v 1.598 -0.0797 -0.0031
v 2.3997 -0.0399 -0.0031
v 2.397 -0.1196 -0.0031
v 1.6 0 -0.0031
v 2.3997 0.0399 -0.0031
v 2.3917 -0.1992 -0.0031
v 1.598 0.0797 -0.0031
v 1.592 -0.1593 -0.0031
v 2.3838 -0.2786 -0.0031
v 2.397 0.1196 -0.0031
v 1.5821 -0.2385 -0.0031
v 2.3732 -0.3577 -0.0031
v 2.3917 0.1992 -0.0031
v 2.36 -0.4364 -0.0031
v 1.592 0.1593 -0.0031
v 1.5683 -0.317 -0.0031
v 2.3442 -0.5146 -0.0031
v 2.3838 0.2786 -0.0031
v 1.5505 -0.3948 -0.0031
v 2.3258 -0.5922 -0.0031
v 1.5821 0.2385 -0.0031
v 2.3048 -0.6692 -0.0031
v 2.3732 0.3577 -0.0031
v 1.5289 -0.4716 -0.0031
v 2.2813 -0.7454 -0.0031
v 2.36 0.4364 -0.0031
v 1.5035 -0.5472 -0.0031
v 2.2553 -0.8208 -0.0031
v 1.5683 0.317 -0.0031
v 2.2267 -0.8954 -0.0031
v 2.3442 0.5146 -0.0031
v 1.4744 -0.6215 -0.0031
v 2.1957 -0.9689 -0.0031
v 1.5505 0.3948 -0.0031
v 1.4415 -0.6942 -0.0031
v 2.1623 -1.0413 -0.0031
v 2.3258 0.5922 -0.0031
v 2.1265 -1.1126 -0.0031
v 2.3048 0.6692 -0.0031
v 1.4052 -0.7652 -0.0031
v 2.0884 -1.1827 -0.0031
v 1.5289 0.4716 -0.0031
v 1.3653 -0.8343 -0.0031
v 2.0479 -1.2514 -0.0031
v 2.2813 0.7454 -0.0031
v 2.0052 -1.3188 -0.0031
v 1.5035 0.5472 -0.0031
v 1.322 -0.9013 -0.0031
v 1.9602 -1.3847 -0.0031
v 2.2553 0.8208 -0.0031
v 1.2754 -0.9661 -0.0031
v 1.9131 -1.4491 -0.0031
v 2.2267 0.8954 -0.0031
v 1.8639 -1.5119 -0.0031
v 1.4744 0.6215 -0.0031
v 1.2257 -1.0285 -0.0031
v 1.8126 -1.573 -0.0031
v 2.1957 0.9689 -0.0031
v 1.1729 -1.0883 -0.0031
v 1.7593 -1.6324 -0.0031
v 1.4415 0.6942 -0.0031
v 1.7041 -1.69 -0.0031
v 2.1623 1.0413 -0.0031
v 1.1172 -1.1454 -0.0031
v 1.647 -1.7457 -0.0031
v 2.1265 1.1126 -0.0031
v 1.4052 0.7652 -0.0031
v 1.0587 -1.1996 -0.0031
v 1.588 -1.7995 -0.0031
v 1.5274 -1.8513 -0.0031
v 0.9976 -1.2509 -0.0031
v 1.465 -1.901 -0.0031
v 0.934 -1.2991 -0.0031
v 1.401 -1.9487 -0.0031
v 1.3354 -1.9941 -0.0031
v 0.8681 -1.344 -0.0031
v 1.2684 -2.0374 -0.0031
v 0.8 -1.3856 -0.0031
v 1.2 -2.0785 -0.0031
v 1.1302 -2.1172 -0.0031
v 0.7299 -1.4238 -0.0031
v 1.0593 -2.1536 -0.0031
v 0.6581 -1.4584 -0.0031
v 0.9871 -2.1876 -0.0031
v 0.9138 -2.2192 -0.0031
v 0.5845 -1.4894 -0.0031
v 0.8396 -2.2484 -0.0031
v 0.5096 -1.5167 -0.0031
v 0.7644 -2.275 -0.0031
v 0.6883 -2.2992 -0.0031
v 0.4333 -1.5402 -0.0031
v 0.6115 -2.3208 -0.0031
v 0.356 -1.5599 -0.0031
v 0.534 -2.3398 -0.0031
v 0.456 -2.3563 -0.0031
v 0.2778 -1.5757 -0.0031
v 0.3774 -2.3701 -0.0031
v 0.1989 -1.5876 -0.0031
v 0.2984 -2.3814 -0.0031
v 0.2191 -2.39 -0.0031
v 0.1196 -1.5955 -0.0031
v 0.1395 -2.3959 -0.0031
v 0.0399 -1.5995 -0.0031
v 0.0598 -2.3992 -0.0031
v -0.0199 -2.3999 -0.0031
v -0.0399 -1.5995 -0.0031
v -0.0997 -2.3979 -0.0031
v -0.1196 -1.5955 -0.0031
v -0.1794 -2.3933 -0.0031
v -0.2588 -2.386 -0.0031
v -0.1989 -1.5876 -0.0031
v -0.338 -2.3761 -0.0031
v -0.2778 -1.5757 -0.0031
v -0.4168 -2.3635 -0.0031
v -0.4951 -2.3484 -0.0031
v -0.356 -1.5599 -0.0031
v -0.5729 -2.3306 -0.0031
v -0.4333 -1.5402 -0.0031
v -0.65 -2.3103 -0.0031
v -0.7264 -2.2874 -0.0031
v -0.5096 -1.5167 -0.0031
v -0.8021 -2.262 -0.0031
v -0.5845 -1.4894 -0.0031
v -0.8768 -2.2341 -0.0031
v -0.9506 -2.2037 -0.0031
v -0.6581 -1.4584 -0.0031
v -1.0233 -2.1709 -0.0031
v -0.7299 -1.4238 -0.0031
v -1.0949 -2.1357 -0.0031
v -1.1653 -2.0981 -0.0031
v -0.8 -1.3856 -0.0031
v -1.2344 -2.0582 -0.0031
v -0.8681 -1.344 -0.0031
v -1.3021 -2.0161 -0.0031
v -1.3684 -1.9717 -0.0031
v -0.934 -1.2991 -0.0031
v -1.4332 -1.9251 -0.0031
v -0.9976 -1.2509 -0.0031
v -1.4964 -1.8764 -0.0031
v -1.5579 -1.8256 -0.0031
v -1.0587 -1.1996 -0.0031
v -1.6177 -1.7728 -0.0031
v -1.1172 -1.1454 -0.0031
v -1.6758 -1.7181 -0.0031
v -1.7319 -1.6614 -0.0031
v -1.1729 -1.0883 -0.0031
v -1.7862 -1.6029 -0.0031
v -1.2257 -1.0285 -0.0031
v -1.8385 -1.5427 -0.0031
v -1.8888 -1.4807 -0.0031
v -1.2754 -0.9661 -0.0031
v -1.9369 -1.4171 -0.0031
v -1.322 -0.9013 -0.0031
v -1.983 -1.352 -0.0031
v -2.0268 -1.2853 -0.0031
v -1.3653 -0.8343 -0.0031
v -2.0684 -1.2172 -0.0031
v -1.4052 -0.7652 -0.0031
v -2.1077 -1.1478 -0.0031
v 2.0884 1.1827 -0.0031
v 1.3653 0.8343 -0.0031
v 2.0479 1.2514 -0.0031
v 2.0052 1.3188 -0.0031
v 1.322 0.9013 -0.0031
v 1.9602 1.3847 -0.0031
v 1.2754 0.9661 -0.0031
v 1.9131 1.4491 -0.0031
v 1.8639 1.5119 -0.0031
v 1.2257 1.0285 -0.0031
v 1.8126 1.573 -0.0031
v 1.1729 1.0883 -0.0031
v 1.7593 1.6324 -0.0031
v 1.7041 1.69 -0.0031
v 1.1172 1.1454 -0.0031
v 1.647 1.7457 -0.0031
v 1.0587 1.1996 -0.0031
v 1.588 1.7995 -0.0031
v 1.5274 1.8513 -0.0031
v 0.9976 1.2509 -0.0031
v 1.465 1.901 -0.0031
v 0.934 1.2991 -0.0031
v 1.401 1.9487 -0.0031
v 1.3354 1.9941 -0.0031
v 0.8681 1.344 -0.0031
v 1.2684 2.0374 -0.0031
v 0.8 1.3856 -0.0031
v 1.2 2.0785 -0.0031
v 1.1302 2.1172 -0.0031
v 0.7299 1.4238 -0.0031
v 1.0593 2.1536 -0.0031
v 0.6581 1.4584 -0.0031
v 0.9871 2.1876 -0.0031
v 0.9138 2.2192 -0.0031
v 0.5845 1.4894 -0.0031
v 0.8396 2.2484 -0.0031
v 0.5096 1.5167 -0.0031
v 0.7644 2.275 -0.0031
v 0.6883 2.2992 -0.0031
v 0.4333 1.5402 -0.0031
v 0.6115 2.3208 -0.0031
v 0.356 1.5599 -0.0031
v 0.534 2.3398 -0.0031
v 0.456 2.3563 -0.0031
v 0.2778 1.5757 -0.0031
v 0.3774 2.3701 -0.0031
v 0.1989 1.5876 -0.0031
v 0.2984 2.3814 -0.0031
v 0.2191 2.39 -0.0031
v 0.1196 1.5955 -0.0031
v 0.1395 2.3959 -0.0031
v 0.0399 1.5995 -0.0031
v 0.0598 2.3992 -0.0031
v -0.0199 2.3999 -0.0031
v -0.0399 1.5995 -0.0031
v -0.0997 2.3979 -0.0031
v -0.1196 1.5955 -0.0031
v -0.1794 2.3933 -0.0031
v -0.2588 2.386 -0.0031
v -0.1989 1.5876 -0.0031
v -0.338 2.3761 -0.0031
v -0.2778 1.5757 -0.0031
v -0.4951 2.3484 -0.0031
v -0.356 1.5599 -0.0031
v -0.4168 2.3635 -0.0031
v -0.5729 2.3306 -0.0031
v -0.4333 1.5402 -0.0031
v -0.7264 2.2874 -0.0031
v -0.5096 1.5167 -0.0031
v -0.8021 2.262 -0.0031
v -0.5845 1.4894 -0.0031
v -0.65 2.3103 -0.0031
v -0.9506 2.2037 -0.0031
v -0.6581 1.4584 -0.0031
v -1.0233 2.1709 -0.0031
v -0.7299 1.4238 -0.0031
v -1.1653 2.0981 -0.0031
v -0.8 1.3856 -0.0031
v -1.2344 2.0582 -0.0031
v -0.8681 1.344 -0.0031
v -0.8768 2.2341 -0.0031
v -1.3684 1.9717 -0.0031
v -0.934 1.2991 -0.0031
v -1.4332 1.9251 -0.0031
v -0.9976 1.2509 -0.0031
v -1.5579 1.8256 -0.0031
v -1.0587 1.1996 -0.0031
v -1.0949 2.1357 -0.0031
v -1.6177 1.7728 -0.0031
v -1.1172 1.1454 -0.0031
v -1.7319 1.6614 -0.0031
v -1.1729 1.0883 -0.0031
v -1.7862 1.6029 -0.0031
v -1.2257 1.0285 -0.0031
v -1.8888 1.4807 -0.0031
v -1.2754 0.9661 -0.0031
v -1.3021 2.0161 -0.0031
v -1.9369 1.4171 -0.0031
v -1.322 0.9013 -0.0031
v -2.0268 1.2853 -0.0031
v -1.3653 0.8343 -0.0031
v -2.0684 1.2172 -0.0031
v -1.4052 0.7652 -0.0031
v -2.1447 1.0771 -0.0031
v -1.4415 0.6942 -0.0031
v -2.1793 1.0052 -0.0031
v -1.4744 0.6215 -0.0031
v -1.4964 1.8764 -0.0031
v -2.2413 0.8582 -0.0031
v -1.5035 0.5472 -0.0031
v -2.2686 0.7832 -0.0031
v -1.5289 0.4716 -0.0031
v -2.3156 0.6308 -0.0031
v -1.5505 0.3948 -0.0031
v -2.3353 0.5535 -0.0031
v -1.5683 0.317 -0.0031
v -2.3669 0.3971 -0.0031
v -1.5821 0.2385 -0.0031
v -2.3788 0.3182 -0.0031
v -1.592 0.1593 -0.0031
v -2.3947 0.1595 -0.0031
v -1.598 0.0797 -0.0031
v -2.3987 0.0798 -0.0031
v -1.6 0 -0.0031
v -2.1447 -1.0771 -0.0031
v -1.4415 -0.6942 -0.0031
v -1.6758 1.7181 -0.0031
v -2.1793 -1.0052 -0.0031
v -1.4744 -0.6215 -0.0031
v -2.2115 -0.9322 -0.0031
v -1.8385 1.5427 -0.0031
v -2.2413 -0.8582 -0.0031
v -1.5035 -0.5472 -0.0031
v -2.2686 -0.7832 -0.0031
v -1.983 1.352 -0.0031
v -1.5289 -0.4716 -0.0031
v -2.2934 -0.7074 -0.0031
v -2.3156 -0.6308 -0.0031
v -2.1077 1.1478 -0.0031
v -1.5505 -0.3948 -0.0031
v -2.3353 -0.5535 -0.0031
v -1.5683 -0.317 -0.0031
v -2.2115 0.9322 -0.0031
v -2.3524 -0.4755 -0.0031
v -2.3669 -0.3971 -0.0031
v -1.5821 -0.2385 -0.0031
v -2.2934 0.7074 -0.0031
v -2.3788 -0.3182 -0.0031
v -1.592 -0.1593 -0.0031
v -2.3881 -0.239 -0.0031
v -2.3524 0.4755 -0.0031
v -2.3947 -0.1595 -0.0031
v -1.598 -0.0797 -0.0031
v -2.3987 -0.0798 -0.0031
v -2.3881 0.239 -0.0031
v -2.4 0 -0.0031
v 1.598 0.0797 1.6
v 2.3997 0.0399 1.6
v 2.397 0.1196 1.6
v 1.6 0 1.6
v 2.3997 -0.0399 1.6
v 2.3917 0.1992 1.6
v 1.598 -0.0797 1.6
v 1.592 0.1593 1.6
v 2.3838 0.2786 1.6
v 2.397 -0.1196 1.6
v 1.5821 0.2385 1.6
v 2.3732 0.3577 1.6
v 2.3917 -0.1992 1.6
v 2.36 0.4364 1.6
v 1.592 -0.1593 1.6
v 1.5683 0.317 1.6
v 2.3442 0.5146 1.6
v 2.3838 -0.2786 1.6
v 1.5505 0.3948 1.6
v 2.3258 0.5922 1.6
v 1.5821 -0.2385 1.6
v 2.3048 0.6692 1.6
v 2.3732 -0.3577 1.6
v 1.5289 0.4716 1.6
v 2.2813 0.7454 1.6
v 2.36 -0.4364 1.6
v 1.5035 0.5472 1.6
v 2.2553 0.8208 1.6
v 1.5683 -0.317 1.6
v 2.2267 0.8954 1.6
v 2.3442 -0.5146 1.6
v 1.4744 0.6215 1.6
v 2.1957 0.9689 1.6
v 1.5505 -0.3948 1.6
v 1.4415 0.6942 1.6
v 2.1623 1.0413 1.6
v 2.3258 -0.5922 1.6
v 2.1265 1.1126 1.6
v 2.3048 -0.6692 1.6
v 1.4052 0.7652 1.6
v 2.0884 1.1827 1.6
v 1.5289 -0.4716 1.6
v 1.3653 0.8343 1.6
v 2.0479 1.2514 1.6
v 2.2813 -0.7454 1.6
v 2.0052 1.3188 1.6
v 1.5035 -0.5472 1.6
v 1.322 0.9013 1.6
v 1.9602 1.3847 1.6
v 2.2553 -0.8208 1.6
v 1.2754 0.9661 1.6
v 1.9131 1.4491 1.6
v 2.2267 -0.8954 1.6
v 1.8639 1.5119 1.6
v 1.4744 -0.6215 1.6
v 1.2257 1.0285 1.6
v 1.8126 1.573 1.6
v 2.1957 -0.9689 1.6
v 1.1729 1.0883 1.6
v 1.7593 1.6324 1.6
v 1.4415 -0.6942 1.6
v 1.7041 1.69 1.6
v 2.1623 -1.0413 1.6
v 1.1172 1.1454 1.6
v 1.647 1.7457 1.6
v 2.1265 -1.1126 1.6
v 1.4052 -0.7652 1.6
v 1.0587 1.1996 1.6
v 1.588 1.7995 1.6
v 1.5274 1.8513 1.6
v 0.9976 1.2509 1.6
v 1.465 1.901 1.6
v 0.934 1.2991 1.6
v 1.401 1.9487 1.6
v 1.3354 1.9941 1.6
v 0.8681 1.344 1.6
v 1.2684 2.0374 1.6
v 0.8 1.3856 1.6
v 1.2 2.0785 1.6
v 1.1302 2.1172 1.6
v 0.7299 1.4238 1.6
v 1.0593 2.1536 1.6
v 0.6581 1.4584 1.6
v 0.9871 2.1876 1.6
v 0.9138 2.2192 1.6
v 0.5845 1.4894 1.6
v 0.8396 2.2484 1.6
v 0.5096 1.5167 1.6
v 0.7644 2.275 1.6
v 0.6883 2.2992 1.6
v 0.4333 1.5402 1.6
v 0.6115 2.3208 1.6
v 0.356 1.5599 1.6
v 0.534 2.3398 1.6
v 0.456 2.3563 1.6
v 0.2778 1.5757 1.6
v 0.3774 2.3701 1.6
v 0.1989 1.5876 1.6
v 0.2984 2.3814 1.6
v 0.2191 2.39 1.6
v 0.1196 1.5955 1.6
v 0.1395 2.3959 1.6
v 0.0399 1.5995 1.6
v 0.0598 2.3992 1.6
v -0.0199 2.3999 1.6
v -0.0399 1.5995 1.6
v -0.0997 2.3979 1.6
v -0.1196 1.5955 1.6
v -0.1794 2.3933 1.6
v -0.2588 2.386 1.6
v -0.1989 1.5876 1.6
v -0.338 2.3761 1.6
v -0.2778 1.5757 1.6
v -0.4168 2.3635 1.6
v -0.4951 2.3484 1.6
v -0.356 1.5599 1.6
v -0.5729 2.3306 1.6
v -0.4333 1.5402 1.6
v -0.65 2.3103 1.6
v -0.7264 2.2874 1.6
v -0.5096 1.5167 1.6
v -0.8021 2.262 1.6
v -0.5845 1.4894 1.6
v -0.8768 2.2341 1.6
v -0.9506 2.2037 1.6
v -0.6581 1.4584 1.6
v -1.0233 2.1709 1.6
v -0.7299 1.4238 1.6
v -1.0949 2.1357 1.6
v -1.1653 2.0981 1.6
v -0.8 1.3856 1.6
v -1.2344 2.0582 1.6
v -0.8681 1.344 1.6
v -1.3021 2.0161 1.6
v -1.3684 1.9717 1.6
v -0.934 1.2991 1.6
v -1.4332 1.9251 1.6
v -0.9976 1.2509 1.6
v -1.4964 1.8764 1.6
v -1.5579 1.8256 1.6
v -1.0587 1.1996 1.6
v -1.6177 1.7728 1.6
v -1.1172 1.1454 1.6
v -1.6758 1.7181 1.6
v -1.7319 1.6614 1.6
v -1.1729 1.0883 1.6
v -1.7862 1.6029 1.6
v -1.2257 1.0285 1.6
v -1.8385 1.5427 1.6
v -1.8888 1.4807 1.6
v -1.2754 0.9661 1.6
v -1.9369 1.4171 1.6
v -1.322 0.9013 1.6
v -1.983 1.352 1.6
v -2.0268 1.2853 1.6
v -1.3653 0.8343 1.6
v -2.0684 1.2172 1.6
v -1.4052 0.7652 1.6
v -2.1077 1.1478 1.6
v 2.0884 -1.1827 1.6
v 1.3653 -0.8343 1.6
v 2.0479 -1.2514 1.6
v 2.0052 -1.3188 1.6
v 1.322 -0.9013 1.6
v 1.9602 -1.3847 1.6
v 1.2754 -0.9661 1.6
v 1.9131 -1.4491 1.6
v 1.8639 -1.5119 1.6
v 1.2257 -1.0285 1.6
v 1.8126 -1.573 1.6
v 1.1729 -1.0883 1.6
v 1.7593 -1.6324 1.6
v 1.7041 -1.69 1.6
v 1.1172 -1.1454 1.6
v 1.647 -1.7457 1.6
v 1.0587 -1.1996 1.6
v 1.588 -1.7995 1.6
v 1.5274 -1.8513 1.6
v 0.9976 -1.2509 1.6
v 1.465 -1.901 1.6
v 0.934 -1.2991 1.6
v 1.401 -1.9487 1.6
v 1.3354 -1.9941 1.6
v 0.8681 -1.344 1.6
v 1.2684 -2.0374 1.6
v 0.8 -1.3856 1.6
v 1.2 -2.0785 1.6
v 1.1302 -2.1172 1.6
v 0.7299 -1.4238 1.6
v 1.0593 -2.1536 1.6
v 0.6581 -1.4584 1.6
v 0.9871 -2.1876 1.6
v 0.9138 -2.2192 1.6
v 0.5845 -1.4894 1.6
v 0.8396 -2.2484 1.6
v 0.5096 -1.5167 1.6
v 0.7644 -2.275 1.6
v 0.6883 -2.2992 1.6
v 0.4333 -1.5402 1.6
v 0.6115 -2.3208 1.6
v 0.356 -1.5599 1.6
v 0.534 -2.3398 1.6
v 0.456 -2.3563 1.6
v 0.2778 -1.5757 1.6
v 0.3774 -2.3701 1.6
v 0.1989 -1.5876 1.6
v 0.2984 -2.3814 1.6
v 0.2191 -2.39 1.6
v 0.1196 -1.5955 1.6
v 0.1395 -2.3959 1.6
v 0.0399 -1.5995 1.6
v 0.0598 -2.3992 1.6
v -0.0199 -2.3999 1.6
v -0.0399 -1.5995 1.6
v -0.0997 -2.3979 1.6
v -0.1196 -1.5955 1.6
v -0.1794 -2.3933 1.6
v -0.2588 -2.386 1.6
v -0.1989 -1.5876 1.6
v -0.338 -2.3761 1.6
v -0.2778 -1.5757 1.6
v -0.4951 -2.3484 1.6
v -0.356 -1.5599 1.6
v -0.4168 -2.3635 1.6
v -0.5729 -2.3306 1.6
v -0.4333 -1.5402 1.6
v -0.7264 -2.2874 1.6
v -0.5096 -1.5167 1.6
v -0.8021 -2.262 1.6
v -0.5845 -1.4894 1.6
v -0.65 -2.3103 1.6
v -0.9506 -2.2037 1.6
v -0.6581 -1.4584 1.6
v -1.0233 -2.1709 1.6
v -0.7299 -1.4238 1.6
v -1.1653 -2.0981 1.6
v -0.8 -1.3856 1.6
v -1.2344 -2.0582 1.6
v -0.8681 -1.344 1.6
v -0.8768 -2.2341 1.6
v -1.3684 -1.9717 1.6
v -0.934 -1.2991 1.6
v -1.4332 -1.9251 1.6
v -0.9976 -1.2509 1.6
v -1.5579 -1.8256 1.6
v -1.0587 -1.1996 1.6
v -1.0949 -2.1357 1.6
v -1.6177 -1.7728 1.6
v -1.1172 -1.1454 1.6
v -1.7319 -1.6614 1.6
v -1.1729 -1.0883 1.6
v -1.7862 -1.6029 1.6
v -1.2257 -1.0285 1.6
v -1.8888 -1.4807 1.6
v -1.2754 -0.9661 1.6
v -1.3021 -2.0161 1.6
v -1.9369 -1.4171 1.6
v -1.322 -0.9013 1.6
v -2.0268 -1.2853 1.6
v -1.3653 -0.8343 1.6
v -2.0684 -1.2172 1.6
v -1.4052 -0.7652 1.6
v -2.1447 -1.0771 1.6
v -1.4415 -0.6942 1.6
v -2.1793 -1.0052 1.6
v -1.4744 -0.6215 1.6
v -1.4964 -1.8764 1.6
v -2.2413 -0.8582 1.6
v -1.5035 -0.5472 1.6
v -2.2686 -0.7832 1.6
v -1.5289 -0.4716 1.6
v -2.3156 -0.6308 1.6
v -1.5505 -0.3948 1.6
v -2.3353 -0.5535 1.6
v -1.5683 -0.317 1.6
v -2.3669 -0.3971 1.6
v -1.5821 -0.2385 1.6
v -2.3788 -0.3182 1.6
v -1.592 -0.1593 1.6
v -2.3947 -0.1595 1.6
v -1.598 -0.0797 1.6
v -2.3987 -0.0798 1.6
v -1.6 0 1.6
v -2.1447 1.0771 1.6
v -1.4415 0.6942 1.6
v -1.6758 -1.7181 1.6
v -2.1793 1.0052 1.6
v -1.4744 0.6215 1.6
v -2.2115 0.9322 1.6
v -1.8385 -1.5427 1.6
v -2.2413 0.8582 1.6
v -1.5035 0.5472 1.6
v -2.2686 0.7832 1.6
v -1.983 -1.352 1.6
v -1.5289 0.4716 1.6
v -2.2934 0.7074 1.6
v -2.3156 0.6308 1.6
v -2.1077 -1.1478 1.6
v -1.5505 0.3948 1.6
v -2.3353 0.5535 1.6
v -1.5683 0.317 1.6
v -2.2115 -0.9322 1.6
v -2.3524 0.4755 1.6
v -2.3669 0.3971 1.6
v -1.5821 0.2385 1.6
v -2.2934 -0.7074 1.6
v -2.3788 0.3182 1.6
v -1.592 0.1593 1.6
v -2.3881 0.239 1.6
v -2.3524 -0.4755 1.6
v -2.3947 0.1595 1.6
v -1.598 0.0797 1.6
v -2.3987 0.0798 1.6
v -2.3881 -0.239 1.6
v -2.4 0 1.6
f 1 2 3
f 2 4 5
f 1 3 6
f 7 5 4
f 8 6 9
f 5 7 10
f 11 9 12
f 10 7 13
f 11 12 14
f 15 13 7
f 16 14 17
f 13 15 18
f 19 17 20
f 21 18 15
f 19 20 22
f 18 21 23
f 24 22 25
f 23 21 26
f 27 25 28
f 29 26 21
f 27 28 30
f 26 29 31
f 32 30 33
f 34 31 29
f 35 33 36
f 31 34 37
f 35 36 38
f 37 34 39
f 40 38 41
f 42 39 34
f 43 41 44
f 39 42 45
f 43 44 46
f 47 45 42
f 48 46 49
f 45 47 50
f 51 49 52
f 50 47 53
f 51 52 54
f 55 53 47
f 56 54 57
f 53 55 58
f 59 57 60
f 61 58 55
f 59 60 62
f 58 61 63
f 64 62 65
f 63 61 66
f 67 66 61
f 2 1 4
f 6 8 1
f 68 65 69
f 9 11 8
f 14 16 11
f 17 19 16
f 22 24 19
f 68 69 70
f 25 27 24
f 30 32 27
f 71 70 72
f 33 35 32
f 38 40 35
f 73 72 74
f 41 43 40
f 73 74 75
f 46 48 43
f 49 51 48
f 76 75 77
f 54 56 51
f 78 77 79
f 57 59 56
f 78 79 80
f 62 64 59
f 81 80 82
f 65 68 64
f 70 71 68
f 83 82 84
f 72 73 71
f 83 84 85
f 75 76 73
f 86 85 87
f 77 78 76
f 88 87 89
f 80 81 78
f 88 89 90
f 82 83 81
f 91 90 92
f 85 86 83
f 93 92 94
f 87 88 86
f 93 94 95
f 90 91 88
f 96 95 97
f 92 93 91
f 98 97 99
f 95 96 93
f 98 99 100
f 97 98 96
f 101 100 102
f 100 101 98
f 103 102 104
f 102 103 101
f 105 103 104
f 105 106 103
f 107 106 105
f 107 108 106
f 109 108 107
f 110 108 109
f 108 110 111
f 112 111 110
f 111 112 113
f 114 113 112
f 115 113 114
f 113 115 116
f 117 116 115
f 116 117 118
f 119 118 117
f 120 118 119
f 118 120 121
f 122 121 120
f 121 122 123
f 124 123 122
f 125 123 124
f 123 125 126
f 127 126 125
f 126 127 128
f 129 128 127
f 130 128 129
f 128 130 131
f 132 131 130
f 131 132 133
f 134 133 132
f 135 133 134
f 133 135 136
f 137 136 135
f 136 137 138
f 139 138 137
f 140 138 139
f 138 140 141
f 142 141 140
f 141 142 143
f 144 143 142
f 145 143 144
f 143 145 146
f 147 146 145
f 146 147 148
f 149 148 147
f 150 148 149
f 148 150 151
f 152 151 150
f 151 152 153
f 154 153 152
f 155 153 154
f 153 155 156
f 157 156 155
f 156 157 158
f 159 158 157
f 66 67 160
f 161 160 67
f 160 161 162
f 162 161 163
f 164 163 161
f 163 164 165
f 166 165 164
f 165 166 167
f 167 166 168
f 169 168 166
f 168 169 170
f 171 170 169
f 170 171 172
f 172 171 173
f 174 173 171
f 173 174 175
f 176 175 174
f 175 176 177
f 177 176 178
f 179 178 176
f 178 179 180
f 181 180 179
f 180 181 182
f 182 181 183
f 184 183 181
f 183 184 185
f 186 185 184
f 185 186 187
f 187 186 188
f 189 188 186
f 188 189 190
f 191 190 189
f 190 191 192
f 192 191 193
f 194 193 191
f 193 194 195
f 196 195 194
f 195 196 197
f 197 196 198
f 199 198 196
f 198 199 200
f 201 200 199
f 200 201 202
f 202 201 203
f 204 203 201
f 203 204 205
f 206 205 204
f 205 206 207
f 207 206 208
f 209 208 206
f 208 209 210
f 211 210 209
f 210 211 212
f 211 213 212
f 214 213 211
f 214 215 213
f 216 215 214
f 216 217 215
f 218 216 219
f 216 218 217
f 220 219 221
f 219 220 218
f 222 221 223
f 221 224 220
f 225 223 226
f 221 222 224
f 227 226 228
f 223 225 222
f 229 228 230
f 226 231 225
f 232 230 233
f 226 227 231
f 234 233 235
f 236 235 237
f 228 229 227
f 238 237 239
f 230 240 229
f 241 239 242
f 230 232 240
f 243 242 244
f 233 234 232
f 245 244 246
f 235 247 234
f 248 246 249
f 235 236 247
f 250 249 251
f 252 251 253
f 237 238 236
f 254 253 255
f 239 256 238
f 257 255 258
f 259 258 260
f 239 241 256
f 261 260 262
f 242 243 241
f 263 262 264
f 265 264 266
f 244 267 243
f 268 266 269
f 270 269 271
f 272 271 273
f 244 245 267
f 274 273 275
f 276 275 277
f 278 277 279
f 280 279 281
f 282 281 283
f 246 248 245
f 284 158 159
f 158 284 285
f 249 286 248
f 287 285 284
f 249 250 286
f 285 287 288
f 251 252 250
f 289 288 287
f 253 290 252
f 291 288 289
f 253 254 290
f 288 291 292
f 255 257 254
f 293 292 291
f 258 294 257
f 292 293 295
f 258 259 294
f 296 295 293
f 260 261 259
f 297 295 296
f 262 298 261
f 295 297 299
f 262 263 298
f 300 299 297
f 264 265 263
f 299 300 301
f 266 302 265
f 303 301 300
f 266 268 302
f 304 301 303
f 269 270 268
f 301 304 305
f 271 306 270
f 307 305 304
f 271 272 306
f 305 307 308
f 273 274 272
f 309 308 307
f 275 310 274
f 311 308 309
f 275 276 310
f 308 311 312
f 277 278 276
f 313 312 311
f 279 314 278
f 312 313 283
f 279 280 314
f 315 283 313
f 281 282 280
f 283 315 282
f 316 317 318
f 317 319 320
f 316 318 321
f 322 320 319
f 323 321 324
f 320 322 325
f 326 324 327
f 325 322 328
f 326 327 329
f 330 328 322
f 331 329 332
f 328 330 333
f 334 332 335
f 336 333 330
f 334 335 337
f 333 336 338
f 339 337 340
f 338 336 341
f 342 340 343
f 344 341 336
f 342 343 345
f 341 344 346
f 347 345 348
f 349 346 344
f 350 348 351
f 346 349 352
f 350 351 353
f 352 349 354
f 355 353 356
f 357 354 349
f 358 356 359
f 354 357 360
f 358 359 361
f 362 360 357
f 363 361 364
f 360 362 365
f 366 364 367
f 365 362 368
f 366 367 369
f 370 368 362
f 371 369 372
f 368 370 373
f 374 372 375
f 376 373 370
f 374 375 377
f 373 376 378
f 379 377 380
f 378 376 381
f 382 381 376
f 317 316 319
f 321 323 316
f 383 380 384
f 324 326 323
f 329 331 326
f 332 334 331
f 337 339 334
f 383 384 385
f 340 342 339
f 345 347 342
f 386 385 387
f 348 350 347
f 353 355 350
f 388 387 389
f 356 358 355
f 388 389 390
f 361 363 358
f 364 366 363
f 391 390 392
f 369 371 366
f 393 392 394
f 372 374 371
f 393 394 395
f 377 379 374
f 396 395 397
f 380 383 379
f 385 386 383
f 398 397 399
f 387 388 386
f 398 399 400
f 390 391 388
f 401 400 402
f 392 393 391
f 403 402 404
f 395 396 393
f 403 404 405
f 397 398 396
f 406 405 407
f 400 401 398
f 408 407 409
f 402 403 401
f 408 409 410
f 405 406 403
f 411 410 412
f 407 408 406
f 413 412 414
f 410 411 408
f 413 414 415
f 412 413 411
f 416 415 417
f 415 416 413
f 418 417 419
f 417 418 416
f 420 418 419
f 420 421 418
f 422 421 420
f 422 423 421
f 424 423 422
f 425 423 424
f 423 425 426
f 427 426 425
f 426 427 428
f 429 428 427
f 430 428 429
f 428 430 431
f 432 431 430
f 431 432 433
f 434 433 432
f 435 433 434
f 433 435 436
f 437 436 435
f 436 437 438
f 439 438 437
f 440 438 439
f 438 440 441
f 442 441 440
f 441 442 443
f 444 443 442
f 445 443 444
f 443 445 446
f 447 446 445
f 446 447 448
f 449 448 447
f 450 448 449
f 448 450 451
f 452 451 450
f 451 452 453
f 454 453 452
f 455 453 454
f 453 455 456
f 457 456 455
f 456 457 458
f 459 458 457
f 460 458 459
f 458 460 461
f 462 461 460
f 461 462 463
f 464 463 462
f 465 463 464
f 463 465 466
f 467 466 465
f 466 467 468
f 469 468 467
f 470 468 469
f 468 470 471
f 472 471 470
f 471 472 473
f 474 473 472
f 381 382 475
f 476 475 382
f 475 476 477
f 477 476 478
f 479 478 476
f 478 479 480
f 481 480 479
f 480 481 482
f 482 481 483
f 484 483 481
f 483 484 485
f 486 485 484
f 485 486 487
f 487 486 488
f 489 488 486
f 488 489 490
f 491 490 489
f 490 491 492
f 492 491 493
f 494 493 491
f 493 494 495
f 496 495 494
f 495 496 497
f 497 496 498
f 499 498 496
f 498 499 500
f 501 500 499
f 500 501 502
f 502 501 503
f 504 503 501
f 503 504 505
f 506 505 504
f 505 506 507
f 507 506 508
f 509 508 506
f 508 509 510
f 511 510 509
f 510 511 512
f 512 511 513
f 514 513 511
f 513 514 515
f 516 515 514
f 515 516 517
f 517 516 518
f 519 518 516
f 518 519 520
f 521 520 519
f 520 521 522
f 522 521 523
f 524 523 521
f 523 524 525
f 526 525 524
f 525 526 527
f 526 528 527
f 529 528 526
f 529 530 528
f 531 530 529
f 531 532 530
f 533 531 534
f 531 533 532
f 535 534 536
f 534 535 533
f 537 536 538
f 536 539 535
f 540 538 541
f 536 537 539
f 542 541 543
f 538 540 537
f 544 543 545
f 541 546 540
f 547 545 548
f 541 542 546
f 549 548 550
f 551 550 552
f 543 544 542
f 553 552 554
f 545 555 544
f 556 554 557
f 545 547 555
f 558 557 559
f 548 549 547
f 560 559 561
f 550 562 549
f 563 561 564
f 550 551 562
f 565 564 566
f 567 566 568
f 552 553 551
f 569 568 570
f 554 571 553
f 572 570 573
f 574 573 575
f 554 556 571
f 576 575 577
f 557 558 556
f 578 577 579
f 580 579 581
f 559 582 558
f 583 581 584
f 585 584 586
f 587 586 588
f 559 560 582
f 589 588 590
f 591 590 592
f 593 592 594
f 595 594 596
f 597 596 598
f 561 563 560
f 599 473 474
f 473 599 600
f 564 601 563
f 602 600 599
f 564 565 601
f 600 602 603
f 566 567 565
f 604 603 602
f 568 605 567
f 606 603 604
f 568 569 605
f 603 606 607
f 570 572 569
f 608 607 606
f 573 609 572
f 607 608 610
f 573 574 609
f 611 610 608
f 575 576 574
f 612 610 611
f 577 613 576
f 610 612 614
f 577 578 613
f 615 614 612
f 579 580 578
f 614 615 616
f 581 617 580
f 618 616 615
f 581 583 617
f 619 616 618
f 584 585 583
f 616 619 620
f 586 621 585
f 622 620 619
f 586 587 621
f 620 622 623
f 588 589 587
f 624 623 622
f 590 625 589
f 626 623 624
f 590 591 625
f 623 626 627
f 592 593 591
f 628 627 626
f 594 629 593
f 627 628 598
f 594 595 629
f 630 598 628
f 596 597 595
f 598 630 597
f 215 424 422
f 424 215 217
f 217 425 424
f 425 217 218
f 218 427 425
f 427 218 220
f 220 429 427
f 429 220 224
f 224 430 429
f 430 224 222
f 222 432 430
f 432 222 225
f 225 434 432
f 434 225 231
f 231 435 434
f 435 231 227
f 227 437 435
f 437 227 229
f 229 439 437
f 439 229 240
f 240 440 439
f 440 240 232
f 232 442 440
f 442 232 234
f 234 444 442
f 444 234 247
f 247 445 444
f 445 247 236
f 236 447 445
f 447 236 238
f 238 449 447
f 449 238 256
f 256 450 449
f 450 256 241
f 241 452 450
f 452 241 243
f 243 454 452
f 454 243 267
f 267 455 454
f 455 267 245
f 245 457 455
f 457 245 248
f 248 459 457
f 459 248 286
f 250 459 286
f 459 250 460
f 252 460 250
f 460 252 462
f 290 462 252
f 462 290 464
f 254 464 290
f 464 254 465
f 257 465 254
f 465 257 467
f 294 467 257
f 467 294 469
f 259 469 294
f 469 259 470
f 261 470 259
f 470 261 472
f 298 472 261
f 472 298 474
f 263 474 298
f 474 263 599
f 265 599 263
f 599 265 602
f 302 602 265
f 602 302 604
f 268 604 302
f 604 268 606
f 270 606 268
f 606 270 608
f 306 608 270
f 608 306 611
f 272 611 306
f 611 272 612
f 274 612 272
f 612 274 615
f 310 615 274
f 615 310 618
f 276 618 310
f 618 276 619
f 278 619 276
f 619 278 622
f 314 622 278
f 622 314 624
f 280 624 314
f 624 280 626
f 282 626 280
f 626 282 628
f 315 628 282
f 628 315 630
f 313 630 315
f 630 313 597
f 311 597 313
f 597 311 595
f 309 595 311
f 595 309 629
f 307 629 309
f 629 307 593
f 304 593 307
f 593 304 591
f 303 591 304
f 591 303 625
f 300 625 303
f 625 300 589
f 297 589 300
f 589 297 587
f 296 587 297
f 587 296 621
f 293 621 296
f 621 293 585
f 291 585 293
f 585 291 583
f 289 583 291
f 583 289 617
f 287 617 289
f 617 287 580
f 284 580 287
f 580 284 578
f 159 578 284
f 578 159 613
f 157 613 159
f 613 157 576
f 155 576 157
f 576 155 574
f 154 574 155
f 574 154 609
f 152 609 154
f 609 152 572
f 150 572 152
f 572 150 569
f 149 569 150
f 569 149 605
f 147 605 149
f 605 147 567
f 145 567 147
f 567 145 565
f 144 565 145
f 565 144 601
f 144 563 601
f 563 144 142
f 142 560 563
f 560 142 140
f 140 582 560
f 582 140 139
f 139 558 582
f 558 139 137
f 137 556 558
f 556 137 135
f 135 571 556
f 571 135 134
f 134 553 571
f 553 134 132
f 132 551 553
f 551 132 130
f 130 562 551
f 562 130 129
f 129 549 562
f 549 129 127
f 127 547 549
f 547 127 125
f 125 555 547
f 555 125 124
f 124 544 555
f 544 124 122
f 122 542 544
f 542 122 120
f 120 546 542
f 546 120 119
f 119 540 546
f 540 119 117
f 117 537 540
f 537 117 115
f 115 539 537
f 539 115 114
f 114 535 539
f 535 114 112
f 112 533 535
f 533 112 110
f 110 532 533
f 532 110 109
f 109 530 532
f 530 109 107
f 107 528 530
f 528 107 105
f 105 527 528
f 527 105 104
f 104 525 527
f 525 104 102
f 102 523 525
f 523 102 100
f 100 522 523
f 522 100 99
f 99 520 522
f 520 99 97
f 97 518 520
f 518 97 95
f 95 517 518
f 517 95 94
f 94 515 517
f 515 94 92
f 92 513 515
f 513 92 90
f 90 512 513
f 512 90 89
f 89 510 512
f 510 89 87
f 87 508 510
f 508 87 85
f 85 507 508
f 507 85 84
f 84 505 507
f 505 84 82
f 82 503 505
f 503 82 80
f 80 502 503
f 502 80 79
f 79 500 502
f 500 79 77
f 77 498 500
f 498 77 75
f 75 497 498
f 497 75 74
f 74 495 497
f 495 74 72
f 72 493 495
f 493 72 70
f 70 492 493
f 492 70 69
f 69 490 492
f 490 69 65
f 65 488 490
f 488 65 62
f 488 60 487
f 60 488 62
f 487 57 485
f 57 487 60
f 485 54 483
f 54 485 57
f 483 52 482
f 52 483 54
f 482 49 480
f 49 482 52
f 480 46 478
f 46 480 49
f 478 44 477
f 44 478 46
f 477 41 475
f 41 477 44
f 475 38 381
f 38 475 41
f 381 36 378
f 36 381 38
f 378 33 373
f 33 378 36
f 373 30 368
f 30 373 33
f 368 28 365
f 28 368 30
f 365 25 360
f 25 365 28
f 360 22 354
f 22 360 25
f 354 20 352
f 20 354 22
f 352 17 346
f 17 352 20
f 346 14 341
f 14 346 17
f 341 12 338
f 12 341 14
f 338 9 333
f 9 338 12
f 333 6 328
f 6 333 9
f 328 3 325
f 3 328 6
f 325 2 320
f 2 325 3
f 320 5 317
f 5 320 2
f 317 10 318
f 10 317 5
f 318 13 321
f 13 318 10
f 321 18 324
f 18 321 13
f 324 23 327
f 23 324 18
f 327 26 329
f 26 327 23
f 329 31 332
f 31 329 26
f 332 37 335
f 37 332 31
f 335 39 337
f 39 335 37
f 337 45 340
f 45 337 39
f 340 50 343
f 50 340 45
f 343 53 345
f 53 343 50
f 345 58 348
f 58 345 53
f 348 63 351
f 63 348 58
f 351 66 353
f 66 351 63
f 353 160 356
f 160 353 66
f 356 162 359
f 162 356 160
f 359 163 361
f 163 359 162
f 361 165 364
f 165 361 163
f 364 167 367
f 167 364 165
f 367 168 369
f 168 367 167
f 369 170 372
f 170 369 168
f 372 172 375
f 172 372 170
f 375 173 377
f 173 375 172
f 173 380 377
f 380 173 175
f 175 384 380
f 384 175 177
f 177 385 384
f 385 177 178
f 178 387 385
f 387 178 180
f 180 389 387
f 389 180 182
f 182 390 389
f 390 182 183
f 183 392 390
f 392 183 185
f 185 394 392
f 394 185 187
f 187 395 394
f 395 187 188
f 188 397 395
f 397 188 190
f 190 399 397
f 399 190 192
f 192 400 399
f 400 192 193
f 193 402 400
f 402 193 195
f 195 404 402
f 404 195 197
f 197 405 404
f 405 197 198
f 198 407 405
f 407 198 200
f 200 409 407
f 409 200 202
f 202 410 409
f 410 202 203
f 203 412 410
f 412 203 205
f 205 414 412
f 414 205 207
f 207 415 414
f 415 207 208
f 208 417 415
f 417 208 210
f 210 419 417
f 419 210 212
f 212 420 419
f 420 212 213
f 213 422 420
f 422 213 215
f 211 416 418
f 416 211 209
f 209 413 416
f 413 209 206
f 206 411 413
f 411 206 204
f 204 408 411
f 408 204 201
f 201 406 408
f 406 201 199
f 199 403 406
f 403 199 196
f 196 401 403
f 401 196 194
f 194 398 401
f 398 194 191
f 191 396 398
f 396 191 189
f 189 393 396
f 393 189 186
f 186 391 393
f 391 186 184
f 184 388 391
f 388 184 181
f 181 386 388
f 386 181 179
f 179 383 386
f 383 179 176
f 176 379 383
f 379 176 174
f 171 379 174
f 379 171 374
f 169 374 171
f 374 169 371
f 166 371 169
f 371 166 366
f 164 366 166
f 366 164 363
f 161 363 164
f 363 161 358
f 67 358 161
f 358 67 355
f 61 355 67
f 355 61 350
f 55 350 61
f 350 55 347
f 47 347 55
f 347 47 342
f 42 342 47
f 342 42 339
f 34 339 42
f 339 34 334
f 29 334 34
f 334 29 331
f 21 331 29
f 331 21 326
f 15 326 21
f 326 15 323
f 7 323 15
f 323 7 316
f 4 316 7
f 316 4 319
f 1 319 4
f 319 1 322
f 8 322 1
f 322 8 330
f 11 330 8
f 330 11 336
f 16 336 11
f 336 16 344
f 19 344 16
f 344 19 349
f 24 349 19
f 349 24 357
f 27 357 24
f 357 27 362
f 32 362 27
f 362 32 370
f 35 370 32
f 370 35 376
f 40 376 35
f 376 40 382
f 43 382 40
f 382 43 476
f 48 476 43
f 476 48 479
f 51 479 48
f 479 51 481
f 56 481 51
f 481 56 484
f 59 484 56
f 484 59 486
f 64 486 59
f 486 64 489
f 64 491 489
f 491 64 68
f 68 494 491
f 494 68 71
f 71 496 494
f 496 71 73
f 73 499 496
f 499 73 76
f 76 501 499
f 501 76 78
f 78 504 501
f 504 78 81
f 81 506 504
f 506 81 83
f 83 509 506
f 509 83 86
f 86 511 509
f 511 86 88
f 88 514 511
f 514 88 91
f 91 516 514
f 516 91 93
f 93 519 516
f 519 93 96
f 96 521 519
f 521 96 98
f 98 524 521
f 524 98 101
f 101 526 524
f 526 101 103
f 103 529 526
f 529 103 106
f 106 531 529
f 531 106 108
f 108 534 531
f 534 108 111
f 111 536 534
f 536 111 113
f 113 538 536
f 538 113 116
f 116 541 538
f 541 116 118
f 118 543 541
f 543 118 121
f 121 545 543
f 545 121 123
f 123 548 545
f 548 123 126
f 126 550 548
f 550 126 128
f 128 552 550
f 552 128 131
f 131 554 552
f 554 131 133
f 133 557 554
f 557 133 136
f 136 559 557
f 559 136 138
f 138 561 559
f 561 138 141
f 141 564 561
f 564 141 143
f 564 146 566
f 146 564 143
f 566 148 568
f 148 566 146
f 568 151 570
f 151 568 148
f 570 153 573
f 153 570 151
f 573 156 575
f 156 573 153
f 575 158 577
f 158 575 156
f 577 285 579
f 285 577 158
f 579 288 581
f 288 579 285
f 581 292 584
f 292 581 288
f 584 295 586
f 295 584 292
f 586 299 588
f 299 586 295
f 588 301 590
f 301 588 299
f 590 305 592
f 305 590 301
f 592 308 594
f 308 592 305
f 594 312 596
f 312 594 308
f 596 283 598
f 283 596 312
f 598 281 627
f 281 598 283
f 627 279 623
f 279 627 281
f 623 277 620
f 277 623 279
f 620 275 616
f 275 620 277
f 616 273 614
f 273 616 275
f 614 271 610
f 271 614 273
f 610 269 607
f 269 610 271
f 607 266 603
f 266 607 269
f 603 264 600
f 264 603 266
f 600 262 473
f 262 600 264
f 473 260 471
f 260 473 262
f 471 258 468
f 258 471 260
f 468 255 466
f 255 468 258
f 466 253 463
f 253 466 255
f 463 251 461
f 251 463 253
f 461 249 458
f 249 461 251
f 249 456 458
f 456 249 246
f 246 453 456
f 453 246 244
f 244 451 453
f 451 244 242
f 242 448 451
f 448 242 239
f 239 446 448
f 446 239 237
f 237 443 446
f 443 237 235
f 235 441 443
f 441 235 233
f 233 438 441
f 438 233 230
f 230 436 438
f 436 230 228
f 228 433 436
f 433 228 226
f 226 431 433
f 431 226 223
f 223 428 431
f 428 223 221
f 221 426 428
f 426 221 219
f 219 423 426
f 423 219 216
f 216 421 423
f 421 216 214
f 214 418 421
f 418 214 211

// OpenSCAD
use <../lib.scad>
use <3626cp8c.scad>
$fa=1; $fs=0.2;
function ldraw_lib__99570(realsolid=false) = [
// 0 =Minifig Head Peach Lips, Smile, Black Eyebrows Pattern (Hollow Stud)
// 0 Name: 99570.dat
// 0 Author: Howard Lande [HowardLande]
// 0 !LDRAW_ORG Part Alias UPDATE 2018-02
// 0 !LICENSE Licensed under CC BY 2.0 and CC BY 4.0 : see CAreadme.txt
// 
// 0 BFC CERTIFY CCW
  [0,"BFC","CERTIFY"],
  [0,"BFC","CCW"],
// 
// 0 !HISTORY 2016-03-26 [MMR1988] Fixed dependency
// 0 !HISTORY 2018-12-08 [PTadmin] Official Update 2018-02
// 
// 
// 1 16 0 0 0 1 0 0 0 1 0 0 0 1 3626cp8c.dat
  [1,16,0,0,0,1,0,0,0,1,0,0,0,1, ldraw_lib__3626cp8c(realsolid)],
];
module ldraw_lib__99570(step=0, col=false, unit=2/5, alt=false, line=0.2, solid=!$preview)
    makepoly(ldraw_lib__99570(solid), step=step, col=col, unit=unit, alt=alt, line=line, solid=solid);
ldraw_lib__99570(line=0.2);
